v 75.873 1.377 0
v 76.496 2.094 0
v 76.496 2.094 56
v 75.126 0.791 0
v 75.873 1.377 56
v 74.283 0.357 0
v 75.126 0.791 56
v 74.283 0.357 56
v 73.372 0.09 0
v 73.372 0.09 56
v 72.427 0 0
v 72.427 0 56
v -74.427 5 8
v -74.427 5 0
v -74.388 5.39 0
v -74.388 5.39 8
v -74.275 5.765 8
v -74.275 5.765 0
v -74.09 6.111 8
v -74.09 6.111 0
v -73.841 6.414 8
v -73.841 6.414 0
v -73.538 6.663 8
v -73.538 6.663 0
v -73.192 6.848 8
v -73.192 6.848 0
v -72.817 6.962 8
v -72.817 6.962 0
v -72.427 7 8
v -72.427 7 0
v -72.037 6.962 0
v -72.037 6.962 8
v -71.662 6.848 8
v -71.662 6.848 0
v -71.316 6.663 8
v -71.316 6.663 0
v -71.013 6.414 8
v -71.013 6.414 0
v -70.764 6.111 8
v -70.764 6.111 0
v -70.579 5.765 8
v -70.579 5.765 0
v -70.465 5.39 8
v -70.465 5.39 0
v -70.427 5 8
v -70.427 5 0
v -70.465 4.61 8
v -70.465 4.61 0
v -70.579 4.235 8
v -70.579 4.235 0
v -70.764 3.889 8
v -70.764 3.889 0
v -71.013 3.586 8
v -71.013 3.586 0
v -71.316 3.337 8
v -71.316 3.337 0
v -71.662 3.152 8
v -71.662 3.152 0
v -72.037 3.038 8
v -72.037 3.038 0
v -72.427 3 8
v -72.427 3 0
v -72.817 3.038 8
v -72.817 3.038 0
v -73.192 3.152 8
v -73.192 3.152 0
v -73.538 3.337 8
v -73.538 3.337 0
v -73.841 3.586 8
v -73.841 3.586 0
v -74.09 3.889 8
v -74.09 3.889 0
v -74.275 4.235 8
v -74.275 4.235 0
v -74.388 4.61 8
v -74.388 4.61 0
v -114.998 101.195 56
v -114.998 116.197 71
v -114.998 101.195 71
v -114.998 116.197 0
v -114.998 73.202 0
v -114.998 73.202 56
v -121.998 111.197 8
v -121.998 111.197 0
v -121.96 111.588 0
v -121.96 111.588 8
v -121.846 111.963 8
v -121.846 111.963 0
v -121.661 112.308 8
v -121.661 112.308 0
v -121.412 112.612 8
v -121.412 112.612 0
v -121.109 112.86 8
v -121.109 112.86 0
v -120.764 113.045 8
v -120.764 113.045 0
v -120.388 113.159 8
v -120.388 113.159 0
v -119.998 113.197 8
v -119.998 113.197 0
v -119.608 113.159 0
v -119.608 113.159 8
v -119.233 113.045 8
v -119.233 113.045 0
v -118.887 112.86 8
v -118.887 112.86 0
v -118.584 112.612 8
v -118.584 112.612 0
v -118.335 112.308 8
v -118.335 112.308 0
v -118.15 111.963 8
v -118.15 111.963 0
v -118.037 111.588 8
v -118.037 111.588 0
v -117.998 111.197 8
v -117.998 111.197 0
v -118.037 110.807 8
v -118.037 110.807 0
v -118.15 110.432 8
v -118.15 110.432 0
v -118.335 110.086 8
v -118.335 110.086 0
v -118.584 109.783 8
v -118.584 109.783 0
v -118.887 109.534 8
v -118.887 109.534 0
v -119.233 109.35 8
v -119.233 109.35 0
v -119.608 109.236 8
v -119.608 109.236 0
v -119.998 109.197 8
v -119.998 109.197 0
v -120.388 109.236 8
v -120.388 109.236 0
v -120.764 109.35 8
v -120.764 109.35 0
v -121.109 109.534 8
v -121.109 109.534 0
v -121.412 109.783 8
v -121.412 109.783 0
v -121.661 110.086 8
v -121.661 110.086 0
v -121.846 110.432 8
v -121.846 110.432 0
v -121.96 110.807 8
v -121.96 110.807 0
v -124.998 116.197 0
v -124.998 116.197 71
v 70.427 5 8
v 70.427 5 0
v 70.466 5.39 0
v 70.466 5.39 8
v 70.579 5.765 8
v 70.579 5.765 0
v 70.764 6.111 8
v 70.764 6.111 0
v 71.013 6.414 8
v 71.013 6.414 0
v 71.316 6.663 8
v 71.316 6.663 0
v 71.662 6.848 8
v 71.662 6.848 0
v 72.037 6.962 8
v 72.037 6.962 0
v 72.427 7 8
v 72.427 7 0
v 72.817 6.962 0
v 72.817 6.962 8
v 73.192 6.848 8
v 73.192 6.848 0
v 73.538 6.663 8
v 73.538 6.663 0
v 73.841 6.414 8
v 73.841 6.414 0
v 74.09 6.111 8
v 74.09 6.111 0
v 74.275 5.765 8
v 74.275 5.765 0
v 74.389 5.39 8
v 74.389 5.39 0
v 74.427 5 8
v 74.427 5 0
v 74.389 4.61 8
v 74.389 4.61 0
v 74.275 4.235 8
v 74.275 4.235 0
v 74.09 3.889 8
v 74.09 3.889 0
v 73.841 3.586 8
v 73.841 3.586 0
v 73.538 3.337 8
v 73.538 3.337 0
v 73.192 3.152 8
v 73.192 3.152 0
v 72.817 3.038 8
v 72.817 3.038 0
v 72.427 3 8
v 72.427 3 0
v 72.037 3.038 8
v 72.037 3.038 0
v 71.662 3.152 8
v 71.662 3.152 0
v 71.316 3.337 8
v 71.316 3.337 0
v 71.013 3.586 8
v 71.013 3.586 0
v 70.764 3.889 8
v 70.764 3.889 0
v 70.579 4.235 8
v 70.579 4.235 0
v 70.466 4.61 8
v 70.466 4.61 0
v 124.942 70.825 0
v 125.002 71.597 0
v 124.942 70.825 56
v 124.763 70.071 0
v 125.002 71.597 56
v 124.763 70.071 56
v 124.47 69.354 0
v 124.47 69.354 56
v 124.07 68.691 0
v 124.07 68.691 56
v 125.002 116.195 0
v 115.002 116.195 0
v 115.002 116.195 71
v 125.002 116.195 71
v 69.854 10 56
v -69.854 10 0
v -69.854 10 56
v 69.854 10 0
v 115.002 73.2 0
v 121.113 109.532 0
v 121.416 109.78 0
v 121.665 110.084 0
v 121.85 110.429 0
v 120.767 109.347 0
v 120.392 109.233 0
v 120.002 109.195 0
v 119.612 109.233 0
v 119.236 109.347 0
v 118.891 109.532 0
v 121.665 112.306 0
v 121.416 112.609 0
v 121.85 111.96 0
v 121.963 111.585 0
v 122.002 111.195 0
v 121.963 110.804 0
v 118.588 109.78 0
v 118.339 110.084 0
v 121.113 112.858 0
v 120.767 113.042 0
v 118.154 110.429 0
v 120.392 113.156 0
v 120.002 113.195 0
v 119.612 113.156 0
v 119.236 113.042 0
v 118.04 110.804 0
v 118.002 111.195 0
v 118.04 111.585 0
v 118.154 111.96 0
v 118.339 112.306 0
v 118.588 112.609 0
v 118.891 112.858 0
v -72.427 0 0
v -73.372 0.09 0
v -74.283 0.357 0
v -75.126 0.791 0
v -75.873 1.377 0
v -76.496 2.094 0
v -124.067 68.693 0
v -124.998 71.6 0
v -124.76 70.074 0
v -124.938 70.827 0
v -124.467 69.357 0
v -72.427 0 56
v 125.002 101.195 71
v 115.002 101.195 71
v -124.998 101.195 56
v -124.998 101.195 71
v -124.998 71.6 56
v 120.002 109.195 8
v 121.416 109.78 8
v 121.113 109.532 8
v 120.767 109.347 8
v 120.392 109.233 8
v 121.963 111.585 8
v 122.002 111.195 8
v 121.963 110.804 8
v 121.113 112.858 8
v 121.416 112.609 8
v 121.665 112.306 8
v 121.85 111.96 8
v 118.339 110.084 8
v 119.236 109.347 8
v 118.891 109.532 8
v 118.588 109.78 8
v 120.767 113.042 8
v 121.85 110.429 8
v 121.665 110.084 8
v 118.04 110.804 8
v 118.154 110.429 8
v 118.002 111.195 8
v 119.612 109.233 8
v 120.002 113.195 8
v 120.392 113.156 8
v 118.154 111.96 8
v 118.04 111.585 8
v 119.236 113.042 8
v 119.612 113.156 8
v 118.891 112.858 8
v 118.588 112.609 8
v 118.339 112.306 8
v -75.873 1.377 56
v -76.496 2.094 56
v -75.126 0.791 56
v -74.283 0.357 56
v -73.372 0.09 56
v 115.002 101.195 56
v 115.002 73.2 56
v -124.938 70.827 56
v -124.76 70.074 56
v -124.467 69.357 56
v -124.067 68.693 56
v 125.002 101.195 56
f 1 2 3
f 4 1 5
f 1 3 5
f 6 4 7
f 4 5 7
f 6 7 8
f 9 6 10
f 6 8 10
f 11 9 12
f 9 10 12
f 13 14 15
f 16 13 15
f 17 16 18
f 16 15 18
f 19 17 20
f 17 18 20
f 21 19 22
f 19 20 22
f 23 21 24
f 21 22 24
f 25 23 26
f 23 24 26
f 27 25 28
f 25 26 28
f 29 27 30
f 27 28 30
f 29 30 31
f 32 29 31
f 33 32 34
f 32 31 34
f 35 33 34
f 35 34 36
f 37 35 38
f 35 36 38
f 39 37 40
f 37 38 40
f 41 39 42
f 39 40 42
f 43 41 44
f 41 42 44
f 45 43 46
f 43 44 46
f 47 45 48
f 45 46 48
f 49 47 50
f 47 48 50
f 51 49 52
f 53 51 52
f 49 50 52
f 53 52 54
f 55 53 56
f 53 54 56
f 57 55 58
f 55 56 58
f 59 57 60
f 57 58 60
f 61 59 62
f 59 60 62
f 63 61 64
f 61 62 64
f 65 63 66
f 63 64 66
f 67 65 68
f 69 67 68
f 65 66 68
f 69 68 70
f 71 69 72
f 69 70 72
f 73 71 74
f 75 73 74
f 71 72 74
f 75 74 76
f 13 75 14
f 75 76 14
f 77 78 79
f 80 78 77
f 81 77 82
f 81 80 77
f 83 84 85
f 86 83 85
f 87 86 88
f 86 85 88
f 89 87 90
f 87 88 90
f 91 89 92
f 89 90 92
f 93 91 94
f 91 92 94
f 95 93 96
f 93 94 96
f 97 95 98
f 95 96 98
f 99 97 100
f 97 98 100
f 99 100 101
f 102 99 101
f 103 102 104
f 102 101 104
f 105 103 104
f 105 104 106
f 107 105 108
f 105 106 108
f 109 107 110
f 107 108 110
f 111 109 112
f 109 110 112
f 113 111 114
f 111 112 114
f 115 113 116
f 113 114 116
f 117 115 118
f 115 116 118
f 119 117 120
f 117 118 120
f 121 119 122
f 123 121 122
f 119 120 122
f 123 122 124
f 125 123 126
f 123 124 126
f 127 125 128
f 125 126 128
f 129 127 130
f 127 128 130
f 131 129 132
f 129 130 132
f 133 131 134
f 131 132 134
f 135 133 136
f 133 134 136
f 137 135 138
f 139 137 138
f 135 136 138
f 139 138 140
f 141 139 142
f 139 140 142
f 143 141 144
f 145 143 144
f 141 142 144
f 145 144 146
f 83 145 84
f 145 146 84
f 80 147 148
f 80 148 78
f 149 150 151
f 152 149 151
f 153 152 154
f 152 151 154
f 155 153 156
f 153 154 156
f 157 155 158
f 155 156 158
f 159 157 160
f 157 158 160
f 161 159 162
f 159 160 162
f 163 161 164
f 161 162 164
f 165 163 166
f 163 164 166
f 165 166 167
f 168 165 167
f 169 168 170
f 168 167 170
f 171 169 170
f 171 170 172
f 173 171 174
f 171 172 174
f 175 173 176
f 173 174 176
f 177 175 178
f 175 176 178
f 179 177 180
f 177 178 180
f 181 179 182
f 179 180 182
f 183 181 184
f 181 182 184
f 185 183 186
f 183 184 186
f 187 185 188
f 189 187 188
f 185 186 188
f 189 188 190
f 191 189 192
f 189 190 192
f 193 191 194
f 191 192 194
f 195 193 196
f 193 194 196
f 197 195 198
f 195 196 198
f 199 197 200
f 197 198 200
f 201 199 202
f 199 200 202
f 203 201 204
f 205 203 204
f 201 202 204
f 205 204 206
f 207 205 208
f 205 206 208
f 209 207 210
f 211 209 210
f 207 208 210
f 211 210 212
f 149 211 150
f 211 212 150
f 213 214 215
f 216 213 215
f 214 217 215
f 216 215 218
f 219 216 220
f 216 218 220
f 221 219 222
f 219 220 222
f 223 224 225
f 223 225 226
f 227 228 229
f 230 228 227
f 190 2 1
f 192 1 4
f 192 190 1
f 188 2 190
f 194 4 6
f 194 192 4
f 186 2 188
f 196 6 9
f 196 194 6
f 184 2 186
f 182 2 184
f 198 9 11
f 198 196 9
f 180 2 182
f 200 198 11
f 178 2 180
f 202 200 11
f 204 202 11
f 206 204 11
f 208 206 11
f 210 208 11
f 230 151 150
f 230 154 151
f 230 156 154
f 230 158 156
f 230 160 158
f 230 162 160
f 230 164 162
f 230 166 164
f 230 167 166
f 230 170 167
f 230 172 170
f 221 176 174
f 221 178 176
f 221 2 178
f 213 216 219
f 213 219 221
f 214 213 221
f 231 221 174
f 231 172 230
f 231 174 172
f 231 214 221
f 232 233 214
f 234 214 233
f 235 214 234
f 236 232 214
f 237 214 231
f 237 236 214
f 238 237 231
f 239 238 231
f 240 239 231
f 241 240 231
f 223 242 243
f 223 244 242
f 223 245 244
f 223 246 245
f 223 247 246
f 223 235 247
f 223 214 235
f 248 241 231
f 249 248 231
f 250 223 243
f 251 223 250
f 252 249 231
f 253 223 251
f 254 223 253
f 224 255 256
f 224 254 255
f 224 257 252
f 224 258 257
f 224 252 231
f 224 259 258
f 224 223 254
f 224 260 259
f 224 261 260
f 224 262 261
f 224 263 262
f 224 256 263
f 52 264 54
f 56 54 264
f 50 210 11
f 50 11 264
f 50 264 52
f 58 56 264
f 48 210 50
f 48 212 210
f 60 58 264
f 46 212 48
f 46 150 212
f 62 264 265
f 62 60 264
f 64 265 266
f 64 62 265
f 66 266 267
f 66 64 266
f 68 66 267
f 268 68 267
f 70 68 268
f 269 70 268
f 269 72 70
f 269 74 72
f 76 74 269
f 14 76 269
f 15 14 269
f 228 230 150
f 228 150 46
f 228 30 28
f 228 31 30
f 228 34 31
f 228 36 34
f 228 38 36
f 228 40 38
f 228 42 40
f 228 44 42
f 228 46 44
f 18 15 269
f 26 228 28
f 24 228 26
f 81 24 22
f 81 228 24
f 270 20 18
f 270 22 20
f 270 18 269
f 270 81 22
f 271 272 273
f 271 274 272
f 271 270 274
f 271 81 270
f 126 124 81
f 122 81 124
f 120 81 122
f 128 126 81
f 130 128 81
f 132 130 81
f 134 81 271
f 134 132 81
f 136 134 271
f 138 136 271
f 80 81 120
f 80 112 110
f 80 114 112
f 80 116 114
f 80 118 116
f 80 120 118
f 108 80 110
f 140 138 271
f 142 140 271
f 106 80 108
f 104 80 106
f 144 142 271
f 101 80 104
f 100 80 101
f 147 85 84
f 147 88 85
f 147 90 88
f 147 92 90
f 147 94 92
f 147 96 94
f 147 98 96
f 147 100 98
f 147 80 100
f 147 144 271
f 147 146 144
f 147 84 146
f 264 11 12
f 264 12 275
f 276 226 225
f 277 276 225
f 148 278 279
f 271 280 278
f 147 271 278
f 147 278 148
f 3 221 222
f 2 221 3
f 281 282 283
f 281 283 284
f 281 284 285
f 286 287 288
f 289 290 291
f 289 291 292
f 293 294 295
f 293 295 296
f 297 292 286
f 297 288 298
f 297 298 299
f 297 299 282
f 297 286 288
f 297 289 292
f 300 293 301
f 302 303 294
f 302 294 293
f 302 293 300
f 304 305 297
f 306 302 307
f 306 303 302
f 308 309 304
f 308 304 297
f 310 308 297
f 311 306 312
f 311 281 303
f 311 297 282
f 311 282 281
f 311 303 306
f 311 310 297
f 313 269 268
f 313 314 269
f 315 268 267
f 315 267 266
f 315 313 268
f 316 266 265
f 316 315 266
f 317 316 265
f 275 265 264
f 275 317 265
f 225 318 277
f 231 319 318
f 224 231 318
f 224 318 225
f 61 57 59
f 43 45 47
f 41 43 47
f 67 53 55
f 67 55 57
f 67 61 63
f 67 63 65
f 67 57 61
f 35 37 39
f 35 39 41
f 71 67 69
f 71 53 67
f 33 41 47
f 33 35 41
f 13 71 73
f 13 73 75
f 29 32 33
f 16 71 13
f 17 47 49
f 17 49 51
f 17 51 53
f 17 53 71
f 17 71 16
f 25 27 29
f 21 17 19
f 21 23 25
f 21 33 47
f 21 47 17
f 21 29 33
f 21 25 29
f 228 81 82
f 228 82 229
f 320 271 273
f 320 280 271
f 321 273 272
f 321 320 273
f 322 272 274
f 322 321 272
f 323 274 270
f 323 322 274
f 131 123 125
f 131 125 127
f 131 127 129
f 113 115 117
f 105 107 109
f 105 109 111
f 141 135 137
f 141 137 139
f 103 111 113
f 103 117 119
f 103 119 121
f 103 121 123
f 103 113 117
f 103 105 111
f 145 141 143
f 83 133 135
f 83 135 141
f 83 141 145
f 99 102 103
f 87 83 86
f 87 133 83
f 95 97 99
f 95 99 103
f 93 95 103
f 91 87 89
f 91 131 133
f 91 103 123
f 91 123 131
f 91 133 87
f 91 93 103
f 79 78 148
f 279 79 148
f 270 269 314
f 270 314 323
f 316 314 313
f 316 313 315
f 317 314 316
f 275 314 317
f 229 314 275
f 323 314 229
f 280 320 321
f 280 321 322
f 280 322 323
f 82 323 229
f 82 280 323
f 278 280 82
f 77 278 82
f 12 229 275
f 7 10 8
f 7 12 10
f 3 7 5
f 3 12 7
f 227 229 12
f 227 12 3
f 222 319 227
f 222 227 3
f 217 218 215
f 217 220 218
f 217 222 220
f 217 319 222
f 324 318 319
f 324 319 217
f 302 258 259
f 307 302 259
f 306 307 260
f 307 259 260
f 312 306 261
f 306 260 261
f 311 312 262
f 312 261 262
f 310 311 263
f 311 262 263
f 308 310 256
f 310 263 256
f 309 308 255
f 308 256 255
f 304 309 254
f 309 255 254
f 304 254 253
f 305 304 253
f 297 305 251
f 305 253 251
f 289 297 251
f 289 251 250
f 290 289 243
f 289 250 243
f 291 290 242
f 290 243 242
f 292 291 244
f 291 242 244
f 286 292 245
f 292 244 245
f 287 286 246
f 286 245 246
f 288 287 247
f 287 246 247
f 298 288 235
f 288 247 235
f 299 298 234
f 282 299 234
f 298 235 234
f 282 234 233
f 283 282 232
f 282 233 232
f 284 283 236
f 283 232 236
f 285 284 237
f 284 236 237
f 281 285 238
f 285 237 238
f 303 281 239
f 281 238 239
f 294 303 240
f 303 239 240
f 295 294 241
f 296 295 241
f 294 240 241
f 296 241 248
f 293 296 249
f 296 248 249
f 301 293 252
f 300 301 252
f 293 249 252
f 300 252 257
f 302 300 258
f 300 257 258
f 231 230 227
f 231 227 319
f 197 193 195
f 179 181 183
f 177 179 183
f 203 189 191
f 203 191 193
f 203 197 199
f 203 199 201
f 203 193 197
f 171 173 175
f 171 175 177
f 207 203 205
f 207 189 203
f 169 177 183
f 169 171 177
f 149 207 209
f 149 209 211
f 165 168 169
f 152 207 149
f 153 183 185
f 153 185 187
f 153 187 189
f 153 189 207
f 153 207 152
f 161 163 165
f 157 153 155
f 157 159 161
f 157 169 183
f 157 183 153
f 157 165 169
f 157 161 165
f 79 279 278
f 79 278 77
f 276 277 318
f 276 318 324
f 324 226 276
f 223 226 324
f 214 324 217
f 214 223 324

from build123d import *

# Parameters (mm, degrees)
BOSS_EXTRU_1_DEPTH      = 71
ESQUISSE3_W             = 324.913222196
ESQUISSE3_H             = 116.889512864
ENL_V_MAT_EXTRU_2_DEPTH = 15
CONG_1_R                = 5
ESQUISSE4_R             = 2
ENL_V_MAT_EXTRU_3_DEPTH = 8


with BuildPart() as part:
    # Esquisse1 → Boss.-Extru.1 (new body)
    with BuildSketch(Plane.XY):
        Polygon((-124.99814732, 116.197326124), (-114.99814732, 116.197326124), (-114.99814732, 73.201979643), (-69.853824471, 10), (69.854159245, 10), (115.001852666, 73.199624684), (115.001852666, 116.194679298), (125.001852666, 116.194679298), (125.001852666, 69.994679298), (75, 0), (-75, 0), (-124.99814732, 69.997326124), align=None)
    extrude(amount=BOSS_EXTRU_1_DEPTH)

    # Esquisse3 → Enlèv. mat.-Extru.2 (cut)
    with BuildSketch(Plane.XY.offset(71)):
        with Locations((-2.475787976, 42.749922866)):
            Rectangle(ESQUISSE3_W, ESQUISSE3_H)
    extrude(amount=-ENL_V_MAT_EXTRU_2_DEPTH, mode=Mode.SUBTRACT)

    # Congé1
    cong_1_edges = [part.edges().sort_by_distance(p)[0] for p in [
        (125.001852666, 69.994679298, 28),
        (75, 0, 28),
        (-75, 0, 28),
        (-124.99814732, 69.997326124, 28),
    ]]
    fillet(cong_1_edges, radius=CONG_1_R)

    # Esquisse4 → Enlèv. mat.-Extru.3 (cut)
    with BuildSketch(Plane(origin=(0, 0, 0), x_dir=(-1, 0, 0), z_dir=(0, 0, -1))):
        with Locations((-72.427079623, 5)):
            Circle(ESQUISSE4_R)
        with Locations((72.426912235, 5)):
            Circle(ESQUISSE4_R)
        with Locations((-120.001852666, 111.194679298)):
            Circle(ESQUISSE4_R)
        with Locations((119.99814732, 111.197326124)):
            Circle(ESQUISSE4_R)
    extrude(amount=-ENL_V_MAT_EXTRU_3_DEPTH, mode=Mode.SUBTRACT)


solid = part.part
